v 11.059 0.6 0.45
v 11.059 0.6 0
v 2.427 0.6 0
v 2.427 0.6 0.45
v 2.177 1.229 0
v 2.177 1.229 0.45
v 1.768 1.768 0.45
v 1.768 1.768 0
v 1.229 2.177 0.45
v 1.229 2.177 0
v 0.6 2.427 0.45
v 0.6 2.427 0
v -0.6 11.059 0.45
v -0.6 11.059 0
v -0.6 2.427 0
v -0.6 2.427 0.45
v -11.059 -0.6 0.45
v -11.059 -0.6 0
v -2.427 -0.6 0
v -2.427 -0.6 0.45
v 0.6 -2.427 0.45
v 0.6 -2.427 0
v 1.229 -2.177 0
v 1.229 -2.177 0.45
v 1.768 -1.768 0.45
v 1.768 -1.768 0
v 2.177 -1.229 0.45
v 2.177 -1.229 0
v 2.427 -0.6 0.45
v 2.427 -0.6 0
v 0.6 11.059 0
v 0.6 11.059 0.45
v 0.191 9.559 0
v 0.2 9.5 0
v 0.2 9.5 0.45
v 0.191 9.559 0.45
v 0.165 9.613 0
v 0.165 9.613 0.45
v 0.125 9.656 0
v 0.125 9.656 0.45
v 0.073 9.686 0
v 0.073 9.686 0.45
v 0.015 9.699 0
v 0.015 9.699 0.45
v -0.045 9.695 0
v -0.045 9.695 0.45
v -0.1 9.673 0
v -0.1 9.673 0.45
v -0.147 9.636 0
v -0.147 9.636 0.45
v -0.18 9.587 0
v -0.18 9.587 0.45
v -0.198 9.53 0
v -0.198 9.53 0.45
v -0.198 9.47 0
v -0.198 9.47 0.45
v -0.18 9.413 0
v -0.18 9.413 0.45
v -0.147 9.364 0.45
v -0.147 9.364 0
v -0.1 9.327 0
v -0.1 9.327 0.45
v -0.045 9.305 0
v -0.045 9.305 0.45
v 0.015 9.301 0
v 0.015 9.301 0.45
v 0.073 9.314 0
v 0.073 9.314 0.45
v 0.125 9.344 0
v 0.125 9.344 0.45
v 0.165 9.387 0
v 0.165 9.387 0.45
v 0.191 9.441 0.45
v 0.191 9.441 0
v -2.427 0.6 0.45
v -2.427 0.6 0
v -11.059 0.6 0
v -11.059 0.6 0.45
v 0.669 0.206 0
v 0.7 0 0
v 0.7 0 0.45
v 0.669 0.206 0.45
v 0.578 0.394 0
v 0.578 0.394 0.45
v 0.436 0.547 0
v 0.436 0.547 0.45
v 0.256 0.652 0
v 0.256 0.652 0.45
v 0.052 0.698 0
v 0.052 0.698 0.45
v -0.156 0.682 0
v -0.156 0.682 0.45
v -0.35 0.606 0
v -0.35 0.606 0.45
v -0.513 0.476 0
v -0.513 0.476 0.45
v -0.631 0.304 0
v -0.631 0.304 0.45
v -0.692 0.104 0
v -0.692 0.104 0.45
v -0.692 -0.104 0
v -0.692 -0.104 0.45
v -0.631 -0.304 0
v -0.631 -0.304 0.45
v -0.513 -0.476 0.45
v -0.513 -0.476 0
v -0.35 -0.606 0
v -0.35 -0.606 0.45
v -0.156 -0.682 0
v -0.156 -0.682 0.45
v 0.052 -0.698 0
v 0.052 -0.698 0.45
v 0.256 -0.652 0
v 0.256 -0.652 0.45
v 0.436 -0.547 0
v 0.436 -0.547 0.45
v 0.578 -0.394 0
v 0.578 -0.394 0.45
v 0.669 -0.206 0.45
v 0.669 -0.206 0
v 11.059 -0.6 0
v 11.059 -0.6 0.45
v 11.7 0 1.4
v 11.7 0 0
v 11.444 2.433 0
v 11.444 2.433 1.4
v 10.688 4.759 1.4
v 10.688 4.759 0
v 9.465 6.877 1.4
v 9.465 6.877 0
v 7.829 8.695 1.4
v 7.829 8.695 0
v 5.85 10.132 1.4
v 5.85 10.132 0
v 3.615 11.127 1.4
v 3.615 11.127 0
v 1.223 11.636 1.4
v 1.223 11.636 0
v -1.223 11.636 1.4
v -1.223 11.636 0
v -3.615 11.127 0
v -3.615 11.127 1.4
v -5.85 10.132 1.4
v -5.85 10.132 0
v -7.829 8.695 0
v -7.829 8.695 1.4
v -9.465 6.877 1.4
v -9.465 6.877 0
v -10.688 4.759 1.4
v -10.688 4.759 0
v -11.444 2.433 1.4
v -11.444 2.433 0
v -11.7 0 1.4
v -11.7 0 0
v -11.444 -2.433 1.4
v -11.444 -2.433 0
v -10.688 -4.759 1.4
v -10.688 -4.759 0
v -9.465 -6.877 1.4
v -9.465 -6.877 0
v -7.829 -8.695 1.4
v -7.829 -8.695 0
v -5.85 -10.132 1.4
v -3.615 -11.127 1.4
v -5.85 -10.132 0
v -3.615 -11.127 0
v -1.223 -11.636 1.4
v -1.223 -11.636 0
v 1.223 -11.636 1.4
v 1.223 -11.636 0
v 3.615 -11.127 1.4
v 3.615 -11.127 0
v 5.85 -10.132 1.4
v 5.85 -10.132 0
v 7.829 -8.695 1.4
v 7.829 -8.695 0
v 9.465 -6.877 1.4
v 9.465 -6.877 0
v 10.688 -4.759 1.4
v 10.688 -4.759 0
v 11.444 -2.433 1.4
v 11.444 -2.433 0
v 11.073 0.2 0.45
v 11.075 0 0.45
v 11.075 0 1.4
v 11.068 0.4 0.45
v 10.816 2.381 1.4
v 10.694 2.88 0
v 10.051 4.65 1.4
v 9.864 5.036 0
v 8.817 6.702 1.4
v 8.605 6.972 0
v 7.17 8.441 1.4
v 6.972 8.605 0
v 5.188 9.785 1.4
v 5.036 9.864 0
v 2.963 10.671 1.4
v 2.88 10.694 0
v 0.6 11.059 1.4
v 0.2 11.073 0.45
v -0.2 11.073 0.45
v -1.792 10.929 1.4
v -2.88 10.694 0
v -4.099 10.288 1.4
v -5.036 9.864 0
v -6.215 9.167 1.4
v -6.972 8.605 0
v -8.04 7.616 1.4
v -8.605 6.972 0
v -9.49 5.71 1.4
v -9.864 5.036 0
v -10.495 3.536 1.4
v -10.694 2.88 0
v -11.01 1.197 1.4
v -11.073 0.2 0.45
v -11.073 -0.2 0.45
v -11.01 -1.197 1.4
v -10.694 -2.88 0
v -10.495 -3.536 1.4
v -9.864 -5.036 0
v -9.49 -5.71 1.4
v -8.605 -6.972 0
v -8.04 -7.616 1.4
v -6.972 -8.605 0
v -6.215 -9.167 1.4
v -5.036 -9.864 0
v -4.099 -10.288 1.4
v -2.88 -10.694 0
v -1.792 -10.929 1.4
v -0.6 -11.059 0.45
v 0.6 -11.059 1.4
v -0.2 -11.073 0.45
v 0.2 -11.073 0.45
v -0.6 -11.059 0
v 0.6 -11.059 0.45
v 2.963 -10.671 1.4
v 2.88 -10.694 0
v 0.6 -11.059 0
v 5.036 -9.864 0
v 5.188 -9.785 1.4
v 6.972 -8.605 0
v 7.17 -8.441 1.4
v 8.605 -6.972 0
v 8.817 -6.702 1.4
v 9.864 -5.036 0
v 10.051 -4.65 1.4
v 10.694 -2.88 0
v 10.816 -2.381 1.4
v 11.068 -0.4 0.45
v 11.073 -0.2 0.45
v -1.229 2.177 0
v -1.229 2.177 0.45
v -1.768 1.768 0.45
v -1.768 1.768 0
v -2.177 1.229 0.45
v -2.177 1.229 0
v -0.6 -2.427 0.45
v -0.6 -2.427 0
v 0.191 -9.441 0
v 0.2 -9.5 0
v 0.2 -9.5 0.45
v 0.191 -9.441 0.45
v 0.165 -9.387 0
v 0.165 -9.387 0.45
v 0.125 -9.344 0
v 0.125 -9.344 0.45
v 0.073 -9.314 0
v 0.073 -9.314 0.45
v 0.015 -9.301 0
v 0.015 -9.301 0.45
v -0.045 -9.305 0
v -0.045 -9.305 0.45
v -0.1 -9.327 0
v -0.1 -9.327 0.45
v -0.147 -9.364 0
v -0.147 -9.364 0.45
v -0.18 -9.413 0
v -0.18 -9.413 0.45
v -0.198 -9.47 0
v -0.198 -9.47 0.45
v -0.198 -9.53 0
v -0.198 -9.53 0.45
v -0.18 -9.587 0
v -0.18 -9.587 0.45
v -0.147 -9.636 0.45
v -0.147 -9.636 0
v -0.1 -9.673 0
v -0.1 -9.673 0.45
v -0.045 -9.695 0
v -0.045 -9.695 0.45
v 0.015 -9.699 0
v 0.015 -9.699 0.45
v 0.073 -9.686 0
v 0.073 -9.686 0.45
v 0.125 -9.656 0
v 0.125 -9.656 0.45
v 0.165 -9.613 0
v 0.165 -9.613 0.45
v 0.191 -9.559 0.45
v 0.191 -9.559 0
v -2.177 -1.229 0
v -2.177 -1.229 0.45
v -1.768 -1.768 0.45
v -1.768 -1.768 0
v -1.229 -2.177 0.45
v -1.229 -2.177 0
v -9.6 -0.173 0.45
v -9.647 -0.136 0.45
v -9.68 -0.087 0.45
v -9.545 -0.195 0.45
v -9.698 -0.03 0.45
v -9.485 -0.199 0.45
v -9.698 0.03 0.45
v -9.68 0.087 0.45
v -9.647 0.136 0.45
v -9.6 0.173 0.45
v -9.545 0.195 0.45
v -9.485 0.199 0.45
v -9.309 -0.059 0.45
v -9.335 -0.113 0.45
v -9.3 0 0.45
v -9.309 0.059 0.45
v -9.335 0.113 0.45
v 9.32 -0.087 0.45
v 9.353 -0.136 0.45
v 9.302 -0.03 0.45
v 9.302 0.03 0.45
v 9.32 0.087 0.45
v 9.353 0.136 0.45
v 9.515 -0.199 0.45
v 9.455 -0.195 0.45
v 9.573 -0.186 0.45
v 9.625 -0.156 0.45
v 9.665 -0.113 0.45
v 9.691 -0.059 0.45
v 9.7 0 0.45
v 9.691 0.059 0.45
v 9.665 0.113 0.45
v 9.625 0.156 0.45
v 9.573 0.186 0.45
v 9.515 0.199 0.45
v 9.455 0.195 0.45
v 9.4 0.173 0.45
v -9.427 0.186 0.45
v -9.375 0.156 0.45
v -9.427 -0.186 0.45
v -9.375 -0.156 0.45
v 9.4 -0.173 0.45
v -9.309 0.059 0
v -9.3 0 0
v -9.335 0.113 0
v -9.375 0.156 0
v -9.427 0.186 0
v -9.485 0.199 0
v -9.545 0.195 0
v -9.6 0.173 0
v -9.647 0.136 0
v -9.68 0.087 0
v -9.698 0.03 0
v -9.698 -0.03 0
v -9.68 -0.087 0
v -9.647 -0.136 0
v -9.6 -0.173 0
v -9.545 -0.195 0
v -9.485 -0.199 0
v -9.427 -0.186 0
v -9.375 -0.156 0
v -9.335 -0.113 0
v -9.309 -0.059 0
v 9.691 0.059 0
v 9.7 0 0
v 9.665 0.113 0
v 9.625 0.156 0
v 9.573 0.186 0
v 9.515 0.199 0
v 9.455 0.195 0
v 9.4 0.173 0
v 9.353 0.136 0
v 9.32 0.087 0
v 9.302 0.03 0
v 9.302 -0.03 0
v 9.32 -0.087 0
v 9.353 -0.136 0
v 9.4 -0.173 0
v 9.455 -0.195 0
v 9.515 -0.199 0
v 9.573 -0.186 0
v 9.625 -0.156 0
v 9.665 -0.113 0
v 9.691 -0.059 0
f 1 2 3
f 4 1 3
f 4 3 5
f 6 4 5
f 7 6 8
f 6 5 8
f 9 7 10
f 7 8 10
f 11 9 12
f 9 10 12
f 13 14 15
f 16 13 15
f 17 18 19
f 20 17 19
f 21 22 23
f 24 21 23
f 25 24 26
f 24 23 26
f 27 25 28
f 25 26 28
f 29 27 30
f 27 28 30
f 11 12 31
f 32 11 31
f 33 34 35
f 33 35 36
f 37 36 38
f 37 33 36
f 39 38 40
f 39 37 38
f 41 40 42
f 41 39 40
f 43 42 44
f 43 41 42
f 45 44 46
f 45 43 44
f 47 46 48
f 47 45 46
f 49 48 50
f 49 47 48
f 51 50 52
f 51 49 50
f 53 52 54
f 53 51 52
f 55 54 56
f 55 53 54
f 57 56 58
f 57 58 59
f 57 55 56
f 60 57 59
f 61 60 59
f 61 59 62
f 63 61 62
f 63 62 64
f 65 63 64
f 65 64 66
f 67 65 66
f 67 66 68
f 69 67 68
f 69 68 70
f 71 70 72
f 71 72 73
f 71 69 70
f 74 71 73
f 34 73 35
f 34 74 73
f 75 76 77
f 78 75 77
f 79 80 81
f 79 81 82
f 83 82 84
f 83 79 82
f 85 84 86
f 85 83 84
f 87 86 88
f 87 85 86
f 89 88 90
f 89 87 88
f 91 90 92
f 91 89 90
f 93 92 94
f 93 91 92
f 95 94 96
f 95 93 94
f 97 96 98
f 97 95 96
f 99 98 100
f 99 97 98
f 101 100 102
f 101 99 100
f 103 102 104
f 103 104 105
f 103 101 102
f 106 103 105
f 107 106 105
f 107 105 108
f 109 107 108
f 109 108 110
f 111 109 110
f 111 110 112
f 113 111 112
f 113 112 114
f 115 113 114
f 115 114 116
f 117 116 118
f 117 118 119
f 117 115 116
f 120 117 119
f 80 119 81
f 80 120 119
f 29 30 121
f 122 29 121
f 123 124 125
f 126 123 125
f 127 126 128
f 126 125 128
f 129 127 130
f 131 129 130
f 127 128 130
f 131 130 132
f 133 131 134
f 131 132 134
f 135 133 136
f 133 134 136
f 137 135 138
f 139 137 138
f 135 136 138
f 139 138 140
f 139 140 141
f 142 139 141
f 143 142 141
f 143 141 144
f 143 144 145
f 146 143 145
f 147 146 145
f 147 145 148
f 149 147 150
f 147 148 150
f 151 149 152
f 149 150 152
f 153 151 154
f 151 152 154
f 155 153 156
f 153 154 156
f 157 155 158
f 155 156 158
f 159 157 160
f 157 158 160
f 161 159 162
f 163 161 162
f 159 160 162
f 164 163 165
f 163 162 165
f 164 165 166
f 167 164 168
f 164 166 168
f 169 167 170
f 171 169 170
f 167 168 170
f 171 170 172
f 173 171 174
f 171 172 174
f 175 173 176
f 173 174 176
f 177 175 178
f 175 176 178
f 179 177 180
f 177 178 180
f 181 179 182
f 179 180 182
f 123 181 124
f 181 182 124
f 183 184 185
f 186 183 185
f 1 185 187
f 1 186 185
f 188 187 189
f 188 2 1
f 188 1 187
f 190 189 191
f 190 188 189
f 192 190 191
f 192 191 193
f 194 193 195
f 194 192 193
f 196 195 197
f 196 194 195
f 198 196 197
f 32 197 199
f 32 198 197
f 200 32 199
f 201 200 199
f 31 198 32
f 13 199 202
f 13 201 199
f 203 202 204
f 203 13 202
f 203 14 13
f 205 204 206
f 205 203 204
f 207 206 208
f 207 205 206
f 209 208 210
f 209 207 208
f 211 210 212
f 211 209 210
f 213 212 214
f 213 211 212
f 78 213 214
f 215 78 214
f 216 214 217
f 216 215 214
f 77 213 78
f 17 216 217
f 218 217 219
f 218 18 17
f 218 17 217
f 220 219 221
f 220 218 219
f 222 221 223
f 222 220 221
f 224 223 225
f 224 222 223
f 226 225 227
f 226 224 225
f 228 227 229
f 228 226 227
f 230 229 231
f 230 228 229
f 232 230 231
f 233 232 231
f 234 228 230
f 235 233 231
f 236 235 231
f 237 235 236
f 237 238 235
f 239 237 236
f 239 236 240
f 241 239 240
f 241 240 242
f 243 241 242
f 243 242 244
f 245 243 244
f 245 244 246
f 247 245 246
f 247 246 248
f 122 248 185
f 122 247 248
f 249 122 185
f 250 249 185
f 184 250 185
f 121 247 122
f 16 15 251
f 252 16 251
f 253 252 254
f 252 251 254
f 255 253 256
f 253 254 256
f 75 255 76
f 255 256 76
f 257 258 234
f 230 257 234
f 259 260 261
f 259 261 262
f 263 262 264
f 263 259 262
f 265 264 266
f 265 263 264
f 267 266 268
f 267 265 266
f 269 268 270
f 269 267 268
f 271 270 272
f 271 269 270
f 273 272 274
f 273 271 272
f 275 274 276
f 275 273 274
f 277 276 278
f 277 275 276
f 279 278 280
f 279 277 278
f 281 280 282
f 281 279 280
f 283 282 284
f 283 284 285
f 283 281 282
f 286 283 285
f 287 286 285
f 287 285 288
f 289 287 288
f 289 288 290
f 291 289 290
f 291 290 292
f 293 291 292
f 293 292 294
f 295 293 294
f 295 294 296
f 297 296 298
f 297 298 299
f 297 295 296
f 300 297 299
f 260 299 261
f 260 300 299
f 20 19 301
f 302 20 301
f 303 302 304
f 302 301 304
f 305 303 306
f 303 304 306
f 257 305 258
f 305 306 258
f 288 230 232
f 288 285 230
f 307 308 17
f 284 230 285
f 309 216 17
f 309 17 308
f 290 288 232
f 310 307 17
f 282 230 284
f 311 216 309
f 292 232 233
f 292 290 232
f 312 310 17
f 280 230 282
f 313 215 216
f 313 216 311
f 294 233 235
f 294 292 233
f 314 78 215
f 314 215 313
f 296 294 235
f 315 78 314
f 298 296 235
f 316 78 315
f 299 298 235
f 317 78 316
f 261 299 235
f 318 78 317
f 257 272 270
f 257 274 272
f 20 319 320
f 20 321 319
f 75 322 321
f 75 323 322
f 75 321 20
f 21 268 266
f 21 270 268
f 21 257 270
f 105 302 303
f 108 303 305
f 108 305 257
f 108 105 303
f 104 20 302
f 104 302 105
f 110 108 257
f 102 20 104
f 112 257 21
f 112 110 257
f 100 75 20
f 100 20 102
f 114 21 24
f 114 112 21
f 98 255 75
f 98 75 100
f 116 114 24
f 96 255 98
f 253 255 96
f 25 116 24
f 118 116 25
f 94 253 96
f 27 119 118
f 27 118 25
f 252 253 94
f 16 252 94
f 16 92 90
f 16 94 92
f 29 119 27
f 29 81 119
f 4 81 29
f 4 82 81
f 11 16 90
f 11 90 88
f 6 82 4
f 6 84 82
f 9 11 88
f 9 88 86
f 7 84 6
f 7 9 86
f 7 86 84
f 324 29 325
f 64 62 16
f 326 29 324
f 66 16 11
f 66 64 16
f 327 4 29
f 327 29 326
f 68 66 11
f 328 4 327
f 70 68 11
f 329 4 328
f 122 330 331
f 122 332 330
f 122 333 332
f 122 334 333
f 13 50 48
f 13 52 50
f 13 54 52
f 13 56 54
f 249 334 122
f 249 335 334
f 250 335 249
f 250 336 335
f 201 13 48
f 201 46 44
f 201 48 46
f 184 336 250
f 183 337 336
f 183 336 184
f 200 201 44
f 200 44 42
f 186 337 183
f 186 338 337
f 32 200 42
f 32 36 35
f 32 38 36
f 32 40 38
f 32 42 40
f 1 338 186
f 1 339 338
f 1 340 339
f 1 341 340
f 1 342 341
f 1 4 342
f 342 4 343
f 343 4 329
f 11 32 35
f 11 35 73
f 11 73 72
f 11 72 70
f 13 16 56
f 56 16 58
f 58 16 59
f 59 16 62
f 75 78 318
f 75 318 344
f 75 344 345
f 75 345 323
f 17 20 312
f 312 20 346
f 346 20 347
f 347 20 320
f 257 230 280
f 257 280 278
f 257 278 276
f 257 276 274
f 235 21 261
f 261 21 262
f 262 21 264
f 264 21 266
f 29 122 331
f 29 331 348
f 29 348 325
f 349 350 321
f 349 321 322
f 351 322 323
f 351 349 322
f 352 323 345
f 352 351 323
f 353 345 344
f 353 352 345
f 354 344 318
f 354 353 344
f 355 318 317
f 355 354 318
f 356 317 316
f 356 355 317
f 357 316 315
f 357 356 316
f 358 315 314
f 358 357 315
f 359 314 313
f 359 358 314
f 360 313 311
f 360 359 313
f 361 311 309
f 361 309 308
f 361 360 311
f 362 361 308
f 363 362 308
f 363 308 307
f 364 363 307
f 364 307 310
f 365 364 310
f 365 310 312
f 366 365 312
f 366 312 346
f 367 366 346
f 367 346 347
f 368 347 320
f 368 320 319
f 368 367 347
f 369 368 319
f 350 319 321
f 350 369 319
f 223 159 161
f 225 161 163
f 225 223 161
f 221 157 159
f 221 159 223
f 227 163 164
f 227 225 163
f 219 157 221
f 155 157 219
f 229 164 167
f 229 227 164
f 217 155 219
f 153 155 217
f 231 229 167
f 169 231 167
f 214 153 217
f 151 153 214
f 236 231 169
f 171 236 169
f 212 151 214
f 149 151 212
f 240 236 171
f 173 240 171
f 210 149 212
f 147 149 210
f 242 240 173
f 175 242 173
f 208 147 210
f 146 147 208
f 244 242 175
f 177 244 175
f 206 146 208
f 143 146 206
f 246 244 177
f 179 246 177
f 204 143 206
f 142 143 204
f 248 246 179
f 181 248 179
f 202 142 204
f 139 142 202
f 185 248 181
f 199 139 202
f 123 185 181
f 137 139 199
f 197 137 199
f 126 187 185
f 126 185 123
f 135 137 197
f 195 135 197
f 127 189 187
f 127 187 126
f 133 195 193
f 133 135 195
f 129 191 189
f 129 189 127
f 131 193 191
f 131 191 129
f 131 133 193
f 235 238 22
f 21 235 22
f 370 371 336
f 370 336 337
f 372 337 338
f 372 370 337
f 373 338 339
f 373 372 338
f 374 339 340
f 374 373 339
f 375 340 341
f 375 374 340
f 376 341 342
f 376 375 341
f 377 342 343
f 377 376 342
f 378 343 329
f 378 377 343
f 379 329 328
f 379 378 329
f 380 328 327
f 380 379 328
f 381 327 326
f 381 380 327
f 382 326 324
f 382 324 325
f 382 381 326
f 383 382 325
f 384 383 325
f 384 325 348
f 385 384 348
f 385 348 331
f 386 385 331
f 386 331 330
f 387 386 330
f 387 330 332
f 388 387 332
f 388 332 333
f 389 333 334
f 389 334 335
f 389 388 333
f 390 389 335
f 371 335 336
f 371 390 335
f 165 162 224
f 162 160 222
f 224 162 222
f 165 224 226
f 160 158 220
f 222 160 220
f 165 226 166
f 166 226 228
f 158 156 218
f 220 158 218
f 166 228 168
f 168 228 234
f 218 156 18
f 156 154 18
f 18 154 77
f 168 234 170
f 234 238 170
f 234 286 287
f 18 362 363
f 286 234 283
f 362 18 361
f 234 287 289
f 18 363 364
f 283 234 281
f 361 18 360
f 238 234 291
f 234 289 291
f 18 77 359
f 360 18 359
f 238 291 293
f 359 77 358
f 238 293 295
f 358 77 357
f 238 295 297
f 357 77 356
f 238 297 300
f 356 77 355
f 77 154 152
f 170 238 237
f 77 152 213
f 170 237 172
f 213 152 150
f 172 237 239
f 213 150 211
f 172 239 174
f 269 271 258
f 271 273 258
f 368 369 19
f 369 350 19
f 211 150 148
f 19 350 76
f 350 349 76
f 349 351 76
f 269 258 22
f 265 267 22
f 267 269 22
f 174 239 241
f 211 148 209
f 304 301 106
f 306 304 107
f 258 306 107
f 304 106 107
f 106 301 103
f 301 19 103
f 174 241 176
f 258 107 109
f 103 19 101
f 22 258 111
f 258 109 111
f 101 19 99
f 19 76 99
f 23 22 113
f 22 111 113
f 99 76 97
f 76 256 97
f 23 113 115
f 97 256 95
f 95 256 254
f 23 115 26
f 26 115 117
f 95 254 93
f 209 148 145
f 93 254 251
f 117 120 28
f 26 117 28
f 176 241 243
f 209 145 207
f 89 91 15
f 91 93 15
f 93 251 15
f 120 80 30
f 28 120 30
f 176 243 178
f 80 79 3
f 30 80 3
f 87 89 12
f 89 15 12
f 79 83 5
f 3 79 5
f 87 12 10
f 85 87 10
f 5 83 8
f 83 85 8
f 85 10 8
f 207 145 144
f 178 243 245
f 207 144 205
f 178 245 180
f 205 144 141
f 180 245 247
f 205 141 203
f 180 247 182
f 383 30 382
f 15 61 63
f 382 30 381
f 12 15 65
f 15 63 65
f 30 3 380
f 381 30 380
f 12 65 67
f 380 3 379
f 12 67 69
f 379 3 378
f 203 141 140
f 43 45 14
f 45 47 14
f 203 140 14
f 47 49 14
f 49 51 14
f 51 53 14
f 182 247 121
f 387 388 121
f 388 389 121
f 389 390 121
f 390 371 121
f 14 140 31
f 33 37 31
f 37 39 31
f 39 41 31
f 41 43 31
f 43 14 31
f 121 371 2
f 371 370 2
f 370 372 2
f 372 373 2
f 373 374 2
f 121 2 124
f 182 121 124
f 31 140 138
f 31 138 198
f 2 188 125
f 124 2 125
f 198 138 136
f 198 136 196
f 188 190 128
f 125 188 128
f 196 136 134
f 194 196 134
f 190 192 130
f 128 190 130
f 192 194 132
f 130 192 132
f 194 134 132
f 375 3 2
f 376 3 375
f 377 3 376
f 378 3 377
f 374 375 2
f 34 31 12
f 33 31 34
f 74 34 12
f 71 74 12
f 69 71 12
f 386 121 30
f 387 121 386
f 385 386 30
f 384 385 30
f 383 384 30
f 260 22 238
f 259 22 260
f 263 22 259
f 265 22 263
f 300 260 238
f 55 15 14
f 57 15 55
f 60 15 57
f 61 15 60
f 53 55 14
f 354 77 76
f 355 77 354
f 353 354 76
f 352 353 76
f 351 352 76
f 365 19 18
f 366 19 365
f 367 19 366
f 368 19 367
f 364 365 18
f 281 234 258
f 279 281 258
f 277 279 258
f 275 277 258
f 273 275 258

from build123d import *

# Parameters (mm, degrees)
SKETCH1_R           = 11.7
BOSS_EXTRUDE1_DEPTH = 1.4
SKETCH1_3_R         = 0.2
SKETCH1_3_R_2       = 0.7
BOSS_EXTRUDE2_DEPTH = 0.45


with BuildPart() as part:
    # Sketch1 → Boss-Extrude1 (new body)
    with BuildSketch(Plane.XY):
        Circle(SKETCH1_R)
        with BuildLine():
            ThreePointArc((0.6, 11.058735235), (7.831207602, 7.831207602), (11.058735235, 0.6))
            ThreePointArc((11.058735235, 0.6), (11.070933062, 0.300110206), (11.075, 0))
            ThreePointArc((11.075, 0), (11.070933062, -0.300110206), (11.058735235, -0.6))
            ThreePointArc((11.058735235, -0.6), (7.831207602, -7.831207602), (0.6, -11.058735235))
            ThreePointArc((0.6, -11.058735235), (0, -11.075), (-0.6, -11.058735235))
            ThreePointArc((-0.6, -11.058735235), (-7.831207602, -7.831207602), (-11.058735235, -0.6))
            ThreePointArc((-11.058735235, -0.6), (-11.075, 0), (-11.058735235, 0.6))
            ThreePointArc((-11.058735235, 0.6), (-7.831207602, 7.831207602), (-0.6, 11.058735235))
            ThreePointArc((-0.6, 11.058735235), (0, 11.075), (0.6, 11.058735235))
        make_face(mode=Mode.SUBTRACT)
    extrude(amount=BOSS_EXTRUDE1_DEPTH)

    # Sketch1<3> → Boss-Extrude2 (add)
    with BuildSketch(Plane.XY):
        with BuildLine():
            Line((11.058735235, 0.6), (2.42693222, 0.6))
            ThreePointArc((2.42693222, 0.6), (1.767766953, 1.767766953), (0.6, 2.42693222))
            Line((0.6, 2.42693222), (0.6, 11.058735235))
            ThreePointArc((0.6, 11.058735235), (0, 11.075), (-0.6, 11.058735235))
            Line((-0.6, 11.058735235), (-0.6, 2.42693222))
            ThreePointArc((-0.6, 2.42693222), (-1.767766953, 1.767766953), (-2.42693222, 0.6))
            Line((-2.42693222, 0.6), (-11.058735235, 0.6))
            ThreePointArc((-11.058735235, 0.6), (-11.075, 0), (-11.058735235, -0.6))
            Line((-11.058735235, -0.6), (-2.42693222, -0.6))
            ThreePointArc((-2.42693222, -0.6), (-1.767766953, -1.767766953), (-0.6, -2.42693222))
            Line((-0.6, -2.42693222), (-0.6, -11.058735235))
            ThreePointArc((-0.6, -11.058735235), (0, -11.075), (0.6, -11.058735235))
            Line((0.6, -11.058735235), (0.6, -2.42693222))
            ThreePointArc((0.6, -2.42693222), (1.767766953, -1.767766953), (2.42693222, -0.6))
            Line((2.42693222, -0.6), (11.058735235, -0.6))
            ThreePointArc((11.058735235, -0.6), (11.075, 0), (11.058735235, 0.6))
        make_face()
        with Locations((9.5, 0)):
            Circle(SKETCH1_3_R, mode=Mode.SUBTRACT)
        Circle(SKETCH1_3_R_2, mode=Mode.SUBTRACT)
        with Locations((0, -9.5)):
            Circle(SKETCH1_3_R, mode=Mode.SUBTRACT)
        with Locations((-9.5, 0)):
            Circle(SKETCH1_3_R, mode=Mode.SUBTRACT)
        with Locations((0, 9.5)):
            Circle(SKETCH1_3_R, mode=Mode.SUBTRACT)
    extrude(amount=BOSS_EXTRUDE2_DEPTH)


solid = part.part
